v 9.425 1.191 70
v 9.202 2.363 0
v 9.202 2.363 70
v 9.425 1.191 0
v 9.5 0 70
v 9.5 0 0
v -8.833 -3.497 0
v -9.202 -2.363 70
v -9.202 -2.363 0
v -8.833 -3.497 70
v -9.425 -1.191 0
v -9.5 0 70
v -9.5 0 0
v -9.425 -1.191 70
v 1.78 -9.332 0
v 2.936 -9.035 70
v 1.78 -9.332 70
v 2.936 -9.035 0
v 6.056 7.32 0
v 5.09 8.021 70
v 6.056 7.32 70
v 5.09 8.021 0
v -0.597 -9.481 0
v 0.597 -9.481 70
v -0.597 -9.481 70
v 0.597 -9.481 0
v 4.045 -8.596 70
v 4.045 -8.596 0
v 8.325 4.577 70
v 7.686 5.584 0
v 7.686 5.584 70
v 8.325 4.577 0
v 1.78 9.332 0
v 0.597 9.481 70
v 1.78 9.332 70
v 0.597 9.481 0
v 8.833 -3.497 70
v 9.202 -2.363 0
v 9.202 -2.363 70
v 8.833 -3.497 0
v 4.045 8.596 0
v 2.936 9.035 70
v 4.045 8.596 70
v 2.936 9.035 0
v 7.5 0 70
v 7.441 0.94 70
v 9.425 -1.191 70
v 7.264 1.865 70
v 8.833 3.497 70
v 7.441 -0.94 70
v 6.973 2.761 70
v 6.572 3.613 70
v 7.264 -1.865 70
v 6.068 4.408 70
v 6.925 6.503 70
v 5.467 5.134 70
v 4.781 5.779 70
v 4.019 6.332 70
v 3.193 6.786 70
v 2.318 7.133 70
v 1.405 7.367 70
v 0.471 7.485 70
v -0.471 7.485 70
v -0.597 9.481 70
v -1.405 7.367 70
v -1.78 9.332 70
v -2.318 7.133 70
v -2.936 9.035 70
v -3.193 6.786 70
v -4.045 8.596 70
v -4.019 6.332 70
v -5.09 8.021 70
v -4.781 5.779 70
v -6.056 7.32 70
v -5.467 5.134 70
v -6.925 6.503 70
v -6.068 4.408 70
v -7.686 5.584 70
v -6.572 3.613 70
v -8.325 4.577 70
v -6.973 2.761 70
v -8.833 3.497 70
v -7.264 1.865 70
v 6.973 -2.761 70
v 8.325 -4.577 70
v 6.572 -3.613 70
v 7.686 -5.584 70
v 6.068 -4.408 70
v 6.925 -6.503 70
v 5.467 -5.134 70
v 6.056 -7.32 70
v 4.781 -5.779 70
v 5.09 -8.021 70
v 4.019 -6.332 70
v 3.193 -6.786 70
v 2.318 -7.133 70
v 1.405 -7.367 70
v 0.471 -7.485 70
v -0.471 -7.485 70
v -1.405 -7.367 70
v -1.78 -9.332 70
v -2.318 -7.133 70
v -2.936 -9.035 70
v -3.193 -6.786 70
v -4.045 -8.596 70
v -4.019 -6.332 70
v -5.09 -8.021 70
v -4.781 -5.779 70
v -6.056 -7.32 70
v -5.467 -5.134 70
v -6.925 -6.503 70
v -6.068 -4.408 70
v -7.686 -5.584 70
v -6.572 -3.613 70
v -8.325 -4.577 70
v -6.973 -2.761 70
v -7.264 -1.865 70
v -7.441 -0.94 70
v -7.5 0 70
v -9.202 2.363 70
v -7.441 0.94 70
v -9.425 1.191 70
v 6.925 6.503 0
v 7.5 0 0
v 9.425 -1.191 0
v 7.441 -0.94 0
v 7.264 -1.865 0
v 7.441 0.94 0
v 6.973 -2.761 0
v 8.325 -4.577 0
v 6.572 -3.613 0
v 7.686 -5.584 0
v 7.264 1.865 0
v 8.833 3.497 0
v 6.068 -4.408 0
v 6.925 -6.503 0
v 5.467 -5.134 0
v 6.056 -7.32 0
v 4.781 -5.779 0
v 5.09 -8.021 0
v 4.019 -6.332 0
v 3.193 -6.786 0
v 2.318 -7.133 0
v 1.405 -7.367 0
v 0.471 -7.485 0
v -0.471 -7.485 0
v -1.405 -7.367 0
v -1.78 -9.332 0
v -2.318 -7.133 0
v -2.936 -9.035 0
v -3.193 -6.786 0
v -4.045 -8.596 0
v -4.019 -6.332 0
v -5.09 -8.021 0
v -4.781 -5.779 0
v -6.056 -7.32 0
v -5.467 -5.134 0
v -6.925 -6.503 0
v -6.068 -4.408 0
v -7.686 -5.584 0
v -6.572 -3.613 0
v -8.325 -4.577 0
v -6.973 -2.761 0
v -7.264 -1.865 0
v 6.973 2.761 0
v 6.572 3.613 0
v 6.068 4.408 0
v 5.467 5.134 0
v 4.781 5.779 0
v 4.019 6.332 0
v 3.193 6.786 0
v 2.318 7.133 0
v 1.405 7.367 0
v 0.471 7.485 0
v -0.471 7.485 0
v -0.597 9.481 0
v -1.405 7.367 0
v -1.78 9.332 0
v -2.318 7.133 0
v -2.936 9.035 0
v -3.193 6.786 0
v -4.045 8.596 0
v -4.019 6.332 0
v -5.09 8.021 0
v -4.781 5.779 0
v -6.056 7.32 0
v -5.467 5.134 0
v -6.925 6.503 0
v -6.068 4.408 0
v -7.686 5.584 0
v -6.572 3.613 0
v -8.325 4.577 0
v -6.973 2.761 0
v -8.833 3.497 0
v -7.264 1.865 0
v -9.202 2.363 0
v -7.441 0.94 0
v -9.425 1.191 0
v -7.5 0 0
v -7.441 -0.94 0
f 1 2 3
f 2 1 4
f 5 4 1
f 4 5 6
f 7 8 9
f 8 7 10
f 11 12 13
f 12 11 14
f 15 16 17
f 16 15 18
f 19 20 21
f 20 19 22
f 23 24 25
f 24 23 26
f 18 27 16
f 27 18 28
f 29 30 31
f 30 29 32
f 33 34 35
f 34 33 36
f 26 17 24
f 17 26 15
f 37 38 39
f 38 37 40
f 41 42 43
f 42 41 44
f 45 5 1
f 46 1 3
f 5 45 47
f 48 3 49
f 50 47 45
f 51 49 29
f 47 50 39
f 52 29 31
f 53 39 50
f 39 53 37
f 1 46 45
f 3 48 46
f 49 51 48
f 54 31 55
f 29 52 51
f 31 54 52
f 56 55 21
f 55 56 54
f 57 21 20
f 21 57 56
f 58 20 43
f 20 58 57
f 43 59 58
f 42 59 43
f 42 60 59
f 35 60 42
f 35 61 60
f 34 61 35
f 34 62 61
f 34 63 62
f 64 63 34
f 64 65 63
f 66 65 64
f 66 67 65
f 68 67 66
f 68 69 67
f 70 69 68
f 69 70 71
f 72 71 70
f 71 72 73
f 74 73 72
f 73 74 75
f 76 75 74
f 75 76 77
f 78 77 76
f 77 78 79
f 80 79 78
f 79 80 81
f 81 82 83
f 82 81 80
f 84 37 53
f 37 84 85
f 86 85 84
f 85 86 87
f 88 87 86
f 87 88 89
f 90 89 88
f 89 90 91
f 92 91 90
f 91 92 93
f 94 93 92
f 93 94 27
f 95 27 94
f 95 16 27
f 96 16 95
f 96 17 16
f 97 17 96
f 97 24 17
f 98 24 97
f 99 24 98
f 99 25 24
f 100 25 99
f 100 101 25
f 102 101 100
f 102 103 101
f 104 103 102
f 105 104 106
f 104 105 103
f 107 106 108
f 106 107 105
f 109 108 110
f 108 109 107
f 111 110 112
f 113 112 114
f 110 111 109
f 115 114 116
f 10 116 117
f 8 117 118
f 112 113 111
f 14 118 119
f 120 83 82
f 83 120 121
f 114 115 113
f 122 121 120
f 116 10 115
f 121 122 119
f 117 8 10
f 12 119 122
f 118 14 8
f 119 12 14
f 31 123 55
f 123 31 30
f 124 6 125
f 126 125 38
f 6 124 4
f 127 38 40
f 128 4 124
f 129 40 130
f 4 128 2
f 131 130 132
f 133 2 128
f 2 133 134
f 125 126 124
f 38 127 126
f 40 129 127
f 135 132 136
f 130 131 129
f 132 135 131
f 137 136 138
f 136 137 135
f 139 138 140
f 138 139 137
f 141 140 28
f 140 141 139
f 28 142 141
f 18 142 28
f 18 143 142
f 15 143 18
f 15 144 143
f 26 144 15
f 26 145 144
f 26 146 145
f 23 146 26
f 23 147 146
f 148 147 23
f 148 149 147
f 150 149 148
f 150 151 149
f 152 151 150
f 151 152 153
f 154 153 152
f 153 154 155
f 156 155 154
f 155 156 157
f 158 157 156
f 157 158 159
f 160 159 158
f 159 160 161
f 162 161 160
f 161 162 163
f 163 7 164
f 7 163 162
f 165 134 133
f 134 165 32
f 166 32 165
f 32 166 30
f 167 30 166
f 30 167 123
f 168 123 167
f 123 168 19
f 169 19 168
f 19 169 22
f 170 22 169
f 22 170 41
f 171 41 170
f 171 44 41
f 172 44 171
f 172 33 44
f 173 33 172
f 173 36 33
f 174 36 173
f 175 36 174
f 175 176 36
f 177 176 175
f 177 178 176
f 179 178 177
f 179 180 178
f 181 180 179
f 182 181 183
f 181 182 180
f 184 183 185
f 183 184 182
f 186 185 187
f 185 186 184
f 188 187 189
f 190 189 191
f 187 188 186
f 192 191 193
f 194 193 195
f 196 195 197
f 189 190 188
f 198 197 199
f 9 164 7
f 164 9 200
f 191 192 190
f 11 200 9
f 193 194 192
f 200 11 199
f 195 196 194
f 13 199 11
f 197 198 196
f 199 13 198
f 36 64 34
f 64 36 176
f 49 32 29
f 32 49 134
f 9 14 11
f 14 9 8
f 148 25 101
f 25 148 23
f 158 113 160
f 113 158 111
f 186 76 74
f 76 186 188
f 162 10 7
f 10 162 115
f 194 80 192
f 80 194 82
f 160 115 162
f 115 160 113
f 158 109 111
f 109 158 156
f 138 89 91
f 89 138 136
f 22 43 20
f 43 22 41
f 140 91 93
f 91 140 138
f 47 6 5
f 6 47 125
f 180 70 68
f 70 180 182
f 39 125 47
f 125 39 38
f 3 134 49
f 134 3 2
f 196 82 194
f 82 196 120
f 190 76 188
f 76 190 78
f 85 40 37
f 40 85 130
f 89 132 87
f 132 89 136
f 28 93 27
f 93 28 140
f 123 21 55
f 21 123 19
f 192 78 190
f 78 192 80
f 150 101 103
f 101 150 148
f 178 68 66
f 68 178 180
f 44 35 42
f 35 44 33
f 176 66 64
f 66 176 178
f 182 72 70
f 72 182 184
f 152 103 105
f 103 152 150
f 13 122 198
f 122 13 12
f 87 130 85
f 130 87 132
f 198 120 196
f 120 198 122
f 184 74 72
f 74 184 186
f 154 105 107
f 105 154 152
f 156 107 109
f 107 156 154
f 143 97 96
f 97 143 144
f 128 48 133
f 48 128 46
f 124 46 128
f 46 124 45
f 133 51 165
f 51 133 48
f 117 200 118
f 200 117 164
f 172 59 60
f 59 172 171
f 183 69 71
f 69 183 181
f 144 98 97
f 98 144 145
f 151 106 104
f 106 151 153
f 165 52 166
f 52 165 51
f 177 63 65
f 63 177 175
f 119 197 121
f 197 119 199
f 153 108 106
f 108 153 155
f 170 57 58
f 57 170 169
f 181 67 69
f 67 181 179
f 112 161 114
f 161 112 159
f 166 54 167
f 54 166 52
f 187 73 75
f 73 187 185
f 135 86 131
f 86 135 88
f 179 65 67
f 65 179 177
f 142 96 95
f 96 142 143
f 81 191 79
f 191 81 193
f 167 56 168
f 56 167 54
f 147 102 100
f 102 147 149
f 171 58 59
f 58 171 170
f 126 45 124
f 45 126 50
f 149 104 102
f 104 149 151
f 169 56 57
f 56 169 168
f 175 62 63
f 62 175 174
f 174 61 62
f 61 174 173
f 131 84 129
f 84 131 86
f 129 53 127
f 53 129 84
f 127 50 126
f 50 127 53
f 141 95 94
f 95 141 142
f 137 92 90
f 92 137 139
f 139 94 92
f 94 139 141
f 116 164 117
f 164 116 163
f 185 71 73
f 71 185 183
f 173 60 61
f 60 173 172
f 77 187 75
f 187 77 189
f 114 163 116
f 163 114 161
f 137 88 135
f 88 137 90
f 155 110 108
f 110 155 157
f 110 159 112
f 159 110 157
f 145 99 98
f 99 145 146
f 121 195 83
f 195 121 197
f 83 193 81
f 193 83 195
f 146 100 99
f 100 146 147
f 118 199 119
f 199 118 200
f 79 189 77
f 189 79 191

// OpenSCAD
//A simple tube designed to connect the head of the massager to the
//Handle.

//Designed to be printed in TPU or another flexible material

thickness = 2;
length =  70;
id = 15;
$fn = 50;

difference(){

    cylinder(h = length, d = id + 2 * thickness);
    cylinder(h = length, d = id);

}
